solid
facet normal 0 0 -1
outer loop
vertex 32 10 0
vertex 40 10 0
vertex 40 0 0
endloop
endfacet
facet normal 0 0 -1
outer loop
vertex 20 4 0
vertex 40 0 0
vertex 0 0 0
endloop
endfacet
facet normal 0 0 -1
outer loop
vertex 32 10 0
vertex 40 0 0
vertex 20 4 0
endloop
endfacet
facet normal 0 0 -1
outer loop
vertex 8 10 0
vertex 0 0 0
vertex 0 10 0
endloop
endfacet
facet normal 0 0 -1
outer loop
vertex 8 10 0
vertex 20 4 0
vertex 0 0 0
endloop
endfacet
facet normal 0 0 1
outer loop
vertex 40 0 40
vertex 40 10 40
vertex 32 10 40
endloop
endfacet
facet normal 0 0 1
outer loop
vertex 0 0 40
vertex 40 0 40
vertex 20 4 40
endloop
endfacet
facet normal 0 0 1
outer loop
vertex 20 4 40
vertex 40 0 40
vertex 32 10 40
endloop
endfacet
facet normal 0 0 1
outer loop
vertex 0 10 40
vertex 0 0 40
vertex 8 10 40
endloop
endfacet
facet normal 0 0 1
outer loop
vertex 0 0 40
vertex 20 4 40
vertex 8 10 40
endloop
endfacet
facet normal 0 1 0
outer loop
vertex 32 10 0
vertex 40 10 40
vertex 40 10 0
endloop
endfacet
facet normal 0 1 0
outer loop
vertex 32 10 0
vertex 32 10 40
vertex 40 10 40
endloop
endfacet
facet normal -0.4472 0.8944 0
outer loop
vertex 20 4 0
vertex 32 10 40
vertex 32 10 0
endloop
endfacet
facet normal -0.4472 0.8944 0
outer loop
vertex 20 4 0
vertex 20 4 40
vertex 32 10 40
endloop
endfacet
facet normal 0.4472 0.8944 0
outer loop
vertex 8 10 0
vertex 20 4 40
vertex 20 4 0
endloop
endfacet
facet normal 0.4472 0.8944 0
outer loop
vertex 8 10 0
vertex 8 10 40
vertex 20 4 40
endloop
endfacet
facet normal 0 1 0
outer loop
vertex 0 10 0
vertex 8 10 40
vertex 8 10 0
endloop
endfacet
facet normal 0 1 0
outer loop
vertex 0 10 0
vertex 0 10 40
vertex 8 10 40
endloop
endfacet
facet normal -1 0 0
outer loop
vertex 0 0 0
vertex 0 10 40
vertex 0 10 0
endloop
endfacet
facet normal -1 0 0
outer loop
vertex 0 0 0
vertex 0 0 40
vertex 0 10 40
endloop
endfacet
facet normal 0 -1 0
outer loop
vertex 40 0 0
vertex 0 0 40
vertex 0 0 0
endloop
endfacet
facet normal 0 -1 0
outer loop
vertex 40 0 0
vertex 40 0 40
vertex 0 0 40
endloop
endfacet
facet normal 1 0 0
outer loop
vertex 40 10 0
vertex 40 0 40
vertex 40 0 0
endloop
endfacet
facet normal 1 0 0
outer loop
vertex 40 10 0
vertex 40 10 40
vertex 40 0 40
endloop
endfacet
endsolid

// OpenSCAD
$fn = 32;

// ----------------------------------------------------------------------
// V guide rail: vway, 40 mm wide
// ----------------------------------------------------------------------

// --- parameters (mm) ---
rail_w = 40;              // rail width, X
base_t = 10;              // base plate thickness
v_depth = 6;              // V feature depth / height
v_half_w = 12;            // half width of the V at the base face
plate_t = 40;             // rail length, Z (the extrusion height)

profile = [[0, 0], [40, 0], [40, 10], [32, 10], [20, 4], [8, 10], [0, 10]];  // primary outline, 7 points, counter clockwise

// --- the one profile operation ---
linear_extrude(height = plate_t) polygon(points = profile);
